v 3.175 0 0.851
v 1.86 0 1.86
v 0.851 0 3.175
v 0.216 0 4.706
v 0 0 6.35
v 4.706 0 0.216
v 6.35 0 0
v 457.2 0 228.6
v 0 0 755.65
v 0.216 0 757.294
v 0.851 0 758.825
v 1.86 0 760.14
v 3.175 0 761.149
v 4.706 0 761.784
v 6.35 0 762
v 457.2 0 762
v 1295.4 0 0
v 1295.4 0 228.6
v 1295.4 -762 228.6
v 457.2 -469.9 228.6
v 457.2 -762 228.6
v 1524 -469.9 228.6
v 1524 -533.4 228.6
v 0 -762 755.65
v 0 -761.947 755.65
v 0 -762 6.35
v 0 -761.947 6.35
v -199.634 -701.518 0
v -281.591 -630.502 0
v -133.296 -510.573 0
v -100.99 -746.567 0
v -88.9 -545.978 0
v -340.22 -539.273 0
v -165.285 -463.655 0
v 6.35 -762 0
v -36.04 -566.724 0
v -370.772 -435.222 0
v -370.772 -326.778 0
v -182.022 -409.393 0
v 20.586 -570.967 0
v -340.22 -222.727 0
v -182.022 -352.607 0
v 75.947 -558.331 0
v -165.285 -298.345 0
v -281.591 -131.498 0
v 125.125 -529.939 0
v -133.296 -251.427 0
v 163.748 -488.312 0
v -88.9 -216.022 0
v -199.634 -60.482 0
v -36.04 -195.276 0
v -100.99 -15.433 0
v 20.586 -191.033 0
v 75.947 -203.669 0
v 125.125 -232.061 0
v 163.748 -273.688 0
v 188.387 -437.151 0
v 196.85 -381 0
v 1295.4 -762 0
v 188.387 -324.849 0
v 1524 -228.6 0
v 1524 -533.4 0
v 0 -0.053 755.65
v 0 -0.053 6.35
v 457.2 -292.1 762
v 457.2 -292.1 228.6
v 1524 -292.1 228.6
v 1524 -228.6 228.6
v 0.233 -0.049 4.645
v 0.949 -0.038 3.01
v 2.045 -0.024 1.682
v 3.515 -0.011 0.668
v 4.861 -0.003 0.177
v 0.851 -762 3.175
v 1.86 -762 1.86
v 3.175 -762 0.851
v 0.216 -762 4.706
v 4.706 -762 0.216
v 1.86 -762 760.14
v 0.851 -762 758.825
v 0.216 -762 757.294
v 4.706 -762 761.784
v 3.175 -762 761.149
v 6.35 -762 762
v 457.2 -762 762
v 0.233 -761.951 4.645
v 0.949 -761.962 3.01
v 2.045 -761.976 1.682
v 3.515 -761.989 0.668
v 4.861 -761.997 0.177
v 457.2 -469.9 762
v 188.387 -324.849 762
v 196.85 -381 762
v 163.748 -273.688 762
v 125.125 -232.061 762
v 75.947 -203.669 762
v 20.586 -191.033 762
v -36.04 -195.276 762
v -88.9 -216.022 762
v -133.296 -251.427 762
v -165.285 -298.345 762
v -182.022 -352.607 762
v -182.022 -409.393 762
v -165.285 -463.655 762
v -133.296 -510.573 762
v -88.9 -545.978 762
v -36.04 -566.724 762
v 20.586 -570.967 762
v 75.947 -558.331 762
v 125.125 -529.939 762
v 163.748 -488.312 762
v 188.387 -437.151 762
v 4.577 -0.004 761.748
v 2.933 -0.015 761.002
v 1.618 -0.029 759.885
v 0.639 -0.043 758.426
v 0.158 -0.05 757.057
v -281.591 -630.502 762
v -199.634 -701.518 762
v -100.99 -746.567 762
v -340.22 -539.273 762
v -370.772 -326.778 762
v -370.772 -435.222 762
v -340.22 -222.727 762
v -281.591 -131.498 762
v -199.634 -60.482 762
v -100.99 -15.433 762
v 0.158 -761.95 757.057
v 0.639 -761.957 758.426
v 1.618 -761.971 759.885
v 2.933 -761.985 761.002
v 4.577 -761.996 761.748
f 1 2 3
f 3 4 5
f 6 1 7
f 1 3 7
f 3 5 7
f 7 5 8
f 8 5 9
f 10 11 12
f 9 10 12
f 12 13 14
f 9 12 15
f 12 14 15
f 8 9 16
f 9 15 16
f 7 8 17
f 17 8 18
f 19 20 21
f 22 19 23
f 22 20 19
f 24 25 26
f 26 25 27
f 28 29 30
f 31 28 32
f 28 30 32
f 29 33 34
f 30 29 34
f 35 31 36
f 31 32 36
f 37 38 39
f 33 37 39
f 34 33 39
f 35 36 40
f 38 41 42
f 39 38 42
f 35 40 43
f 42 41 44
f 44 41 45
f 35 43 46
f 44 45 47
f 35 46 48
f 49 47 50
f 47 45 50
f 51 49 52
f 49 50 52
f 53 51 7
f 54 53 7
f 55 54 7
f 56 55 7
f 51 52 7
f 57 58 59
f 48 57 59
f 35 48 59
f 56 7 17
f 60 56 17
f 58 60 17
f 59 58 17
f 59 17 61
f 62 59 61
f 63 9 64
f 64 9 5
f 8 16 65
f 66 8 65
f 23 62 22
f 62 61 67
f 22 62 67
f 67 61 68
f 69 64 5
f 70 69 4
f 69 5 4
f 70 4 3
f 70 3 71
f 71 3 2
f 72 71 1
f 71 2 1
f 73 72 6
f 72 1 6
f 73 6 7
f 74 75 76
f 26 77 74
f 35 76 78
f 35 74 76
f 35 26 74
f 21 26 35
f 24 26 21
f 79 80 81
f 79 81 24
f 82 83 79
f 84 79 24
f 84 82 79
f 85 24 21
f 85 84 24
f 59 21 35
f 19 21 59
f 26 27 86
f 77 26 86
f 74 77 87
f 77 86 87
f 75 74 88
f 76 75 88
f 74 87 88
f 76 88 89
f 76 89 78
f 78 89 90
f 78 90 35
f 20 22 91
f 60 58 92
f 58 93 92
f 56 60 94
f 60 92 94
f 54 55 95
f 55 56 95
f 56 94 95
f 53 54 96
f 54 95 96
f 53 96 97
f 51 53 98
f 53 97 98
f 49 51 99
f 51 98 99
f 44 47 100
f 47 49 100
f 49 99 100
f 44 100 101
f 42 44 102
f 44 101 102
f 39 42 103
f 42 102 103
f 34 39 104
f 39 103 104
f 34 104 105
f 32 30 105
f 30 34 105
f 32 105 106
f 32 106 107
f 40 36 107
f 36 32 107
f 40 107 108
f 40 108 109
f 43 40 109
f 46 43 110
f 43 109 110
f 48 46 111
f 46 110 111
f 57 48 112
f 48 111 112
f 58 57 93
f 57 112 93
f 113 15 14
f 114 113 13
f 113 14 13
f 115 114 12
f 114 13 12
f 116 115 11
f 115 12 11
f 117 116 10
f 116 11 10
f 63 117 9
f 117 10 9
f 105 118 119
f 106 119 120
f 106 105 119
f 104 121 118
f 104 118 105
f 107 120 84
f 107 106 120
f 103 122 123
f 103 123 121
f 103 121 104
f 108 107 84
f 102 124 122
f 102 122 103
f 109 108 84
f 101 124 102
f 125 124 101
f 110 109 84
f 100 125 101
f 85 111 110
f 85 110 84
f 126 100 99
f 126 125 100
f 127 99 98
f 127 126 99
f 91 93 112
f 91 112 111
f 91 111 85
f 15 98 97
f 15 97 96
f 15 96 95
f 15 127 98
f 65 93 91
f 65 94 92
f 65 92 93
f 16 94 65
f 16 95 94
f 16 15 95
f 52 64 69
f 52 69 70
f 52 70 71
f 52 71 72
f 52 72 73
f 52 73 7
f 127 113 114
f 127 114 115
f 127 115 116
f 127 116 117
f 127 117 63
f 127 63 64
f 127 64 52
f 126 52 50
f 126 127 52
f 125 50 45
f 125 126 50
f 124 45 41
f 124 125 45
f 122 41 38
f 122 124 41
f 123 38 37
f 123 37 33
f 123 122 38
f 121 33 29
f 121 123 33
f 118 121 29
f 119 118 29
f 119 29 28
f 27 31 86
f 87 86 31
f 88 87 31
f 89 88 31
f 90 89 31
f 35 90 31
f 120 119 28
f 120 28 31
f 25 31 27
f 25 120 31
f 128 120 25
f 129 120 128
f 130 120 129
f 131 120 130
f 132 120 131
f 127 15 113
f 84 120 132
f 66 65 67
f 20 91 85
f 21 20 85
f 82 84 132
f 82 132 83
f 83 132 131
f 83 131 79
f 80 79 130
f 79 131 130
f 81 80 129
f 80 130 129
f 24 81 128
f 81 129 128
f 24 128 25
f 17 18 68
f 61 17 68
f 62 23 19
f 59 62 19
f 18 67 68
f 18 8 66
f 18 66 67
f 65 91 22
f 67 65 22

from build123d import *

# Parameters (mm, degrees)
F1_DEPTH = 762
F3_DEPTH = 762.001
F4_DEPTH = 533.4
F6_DEPTH = 469.901
F8_DEPTH = 762
F7_R     = 190.5
F9_DEPTH = 762.0010001


with BuildPart() as f1:
    # F0 (on Front) → F1 (new body)
    with BuildSketch(Plane.XZ):
        with BuildLine():
            ThreePointArc((0, 6.35), (1.8598719395, 1.8598719395), (6.35, 0))
            Line((6.35, 0), (1524, 0))
            Line((1524, 0), (1524, 762))
            Line((1524, 762), (6.35, 762))
            ThreePointArc((6.35, 762), (1.8598719395, 760.1401280605), (0, 755.65))
            Line((0, 755.65), (0, 6.35))
        make_face()
    extrude(amount=F1_DEPTH)

    # F2 (on face) → F3 (cut, through all)
    with BuildSketch(Plane.XY.offset(762)):
        Polygon((1524, -228.6), (1524, 0), (1295.4, 0), align=None)
        Polygon((1524, -762), (1524, -533.4), (1295.4, -762), align=None)
    extrude(amount=-F3_DEPTH, mode=Mode.SUBTRACT)

    # F2 (on face) → F4 (cut)
    with BuildSketch(Plane.XY.offset(762)):
        Polygon((1524, -292.1), (1524, -228.6), (1295.4, 0), (457.2, 0), (457.2, -292.1), align=None)
        Polygon((1524, -533.4), (1524, -469.9), (457.2, -469.9), (457.2, -762), (1295.4, -762), align=None)
    extrude(amount=-F4_DEPTH, mode=Mode.SUBTRACT)

    # F5 (on face) → F6 (cut, through all)
    with BuildSketch(Plane.XZ.offset(469.9)):
        Polygon((1524, 762), (457.2, 762), (1524, 228.6), align=None)
    extrude(amount=-F6_DEPTH, mode=Mode.SUBTRACT)

    # F7 (on face) → F8 (join)
    with BuildSketch(Plane.XY.offset(762)):
        with BuildLine():
            Line((6.35, -190.5), (6.35, 0))
            ThreePointArc((6.35, 0), (-374.65, -381), (6.35, -762))
            Line((6.35, -762), (6.35, -571.5))
            ThreePointArc((6.35, -571.5), (-184.15, -381), (6.35, -190.5))
        make_face()
    extrude(amount=-F8_DEPTH)

    # F7 (on face) → F9 (cut, through all)
    with BuildSketch(Plane.XY.offset(762)):
        with Locations((6.35, -381)):
            Circle(F7_R)
    extrude(amount=-F9_DEPTH, mode=Mode.SUBTRACT)


solid = f1.part
